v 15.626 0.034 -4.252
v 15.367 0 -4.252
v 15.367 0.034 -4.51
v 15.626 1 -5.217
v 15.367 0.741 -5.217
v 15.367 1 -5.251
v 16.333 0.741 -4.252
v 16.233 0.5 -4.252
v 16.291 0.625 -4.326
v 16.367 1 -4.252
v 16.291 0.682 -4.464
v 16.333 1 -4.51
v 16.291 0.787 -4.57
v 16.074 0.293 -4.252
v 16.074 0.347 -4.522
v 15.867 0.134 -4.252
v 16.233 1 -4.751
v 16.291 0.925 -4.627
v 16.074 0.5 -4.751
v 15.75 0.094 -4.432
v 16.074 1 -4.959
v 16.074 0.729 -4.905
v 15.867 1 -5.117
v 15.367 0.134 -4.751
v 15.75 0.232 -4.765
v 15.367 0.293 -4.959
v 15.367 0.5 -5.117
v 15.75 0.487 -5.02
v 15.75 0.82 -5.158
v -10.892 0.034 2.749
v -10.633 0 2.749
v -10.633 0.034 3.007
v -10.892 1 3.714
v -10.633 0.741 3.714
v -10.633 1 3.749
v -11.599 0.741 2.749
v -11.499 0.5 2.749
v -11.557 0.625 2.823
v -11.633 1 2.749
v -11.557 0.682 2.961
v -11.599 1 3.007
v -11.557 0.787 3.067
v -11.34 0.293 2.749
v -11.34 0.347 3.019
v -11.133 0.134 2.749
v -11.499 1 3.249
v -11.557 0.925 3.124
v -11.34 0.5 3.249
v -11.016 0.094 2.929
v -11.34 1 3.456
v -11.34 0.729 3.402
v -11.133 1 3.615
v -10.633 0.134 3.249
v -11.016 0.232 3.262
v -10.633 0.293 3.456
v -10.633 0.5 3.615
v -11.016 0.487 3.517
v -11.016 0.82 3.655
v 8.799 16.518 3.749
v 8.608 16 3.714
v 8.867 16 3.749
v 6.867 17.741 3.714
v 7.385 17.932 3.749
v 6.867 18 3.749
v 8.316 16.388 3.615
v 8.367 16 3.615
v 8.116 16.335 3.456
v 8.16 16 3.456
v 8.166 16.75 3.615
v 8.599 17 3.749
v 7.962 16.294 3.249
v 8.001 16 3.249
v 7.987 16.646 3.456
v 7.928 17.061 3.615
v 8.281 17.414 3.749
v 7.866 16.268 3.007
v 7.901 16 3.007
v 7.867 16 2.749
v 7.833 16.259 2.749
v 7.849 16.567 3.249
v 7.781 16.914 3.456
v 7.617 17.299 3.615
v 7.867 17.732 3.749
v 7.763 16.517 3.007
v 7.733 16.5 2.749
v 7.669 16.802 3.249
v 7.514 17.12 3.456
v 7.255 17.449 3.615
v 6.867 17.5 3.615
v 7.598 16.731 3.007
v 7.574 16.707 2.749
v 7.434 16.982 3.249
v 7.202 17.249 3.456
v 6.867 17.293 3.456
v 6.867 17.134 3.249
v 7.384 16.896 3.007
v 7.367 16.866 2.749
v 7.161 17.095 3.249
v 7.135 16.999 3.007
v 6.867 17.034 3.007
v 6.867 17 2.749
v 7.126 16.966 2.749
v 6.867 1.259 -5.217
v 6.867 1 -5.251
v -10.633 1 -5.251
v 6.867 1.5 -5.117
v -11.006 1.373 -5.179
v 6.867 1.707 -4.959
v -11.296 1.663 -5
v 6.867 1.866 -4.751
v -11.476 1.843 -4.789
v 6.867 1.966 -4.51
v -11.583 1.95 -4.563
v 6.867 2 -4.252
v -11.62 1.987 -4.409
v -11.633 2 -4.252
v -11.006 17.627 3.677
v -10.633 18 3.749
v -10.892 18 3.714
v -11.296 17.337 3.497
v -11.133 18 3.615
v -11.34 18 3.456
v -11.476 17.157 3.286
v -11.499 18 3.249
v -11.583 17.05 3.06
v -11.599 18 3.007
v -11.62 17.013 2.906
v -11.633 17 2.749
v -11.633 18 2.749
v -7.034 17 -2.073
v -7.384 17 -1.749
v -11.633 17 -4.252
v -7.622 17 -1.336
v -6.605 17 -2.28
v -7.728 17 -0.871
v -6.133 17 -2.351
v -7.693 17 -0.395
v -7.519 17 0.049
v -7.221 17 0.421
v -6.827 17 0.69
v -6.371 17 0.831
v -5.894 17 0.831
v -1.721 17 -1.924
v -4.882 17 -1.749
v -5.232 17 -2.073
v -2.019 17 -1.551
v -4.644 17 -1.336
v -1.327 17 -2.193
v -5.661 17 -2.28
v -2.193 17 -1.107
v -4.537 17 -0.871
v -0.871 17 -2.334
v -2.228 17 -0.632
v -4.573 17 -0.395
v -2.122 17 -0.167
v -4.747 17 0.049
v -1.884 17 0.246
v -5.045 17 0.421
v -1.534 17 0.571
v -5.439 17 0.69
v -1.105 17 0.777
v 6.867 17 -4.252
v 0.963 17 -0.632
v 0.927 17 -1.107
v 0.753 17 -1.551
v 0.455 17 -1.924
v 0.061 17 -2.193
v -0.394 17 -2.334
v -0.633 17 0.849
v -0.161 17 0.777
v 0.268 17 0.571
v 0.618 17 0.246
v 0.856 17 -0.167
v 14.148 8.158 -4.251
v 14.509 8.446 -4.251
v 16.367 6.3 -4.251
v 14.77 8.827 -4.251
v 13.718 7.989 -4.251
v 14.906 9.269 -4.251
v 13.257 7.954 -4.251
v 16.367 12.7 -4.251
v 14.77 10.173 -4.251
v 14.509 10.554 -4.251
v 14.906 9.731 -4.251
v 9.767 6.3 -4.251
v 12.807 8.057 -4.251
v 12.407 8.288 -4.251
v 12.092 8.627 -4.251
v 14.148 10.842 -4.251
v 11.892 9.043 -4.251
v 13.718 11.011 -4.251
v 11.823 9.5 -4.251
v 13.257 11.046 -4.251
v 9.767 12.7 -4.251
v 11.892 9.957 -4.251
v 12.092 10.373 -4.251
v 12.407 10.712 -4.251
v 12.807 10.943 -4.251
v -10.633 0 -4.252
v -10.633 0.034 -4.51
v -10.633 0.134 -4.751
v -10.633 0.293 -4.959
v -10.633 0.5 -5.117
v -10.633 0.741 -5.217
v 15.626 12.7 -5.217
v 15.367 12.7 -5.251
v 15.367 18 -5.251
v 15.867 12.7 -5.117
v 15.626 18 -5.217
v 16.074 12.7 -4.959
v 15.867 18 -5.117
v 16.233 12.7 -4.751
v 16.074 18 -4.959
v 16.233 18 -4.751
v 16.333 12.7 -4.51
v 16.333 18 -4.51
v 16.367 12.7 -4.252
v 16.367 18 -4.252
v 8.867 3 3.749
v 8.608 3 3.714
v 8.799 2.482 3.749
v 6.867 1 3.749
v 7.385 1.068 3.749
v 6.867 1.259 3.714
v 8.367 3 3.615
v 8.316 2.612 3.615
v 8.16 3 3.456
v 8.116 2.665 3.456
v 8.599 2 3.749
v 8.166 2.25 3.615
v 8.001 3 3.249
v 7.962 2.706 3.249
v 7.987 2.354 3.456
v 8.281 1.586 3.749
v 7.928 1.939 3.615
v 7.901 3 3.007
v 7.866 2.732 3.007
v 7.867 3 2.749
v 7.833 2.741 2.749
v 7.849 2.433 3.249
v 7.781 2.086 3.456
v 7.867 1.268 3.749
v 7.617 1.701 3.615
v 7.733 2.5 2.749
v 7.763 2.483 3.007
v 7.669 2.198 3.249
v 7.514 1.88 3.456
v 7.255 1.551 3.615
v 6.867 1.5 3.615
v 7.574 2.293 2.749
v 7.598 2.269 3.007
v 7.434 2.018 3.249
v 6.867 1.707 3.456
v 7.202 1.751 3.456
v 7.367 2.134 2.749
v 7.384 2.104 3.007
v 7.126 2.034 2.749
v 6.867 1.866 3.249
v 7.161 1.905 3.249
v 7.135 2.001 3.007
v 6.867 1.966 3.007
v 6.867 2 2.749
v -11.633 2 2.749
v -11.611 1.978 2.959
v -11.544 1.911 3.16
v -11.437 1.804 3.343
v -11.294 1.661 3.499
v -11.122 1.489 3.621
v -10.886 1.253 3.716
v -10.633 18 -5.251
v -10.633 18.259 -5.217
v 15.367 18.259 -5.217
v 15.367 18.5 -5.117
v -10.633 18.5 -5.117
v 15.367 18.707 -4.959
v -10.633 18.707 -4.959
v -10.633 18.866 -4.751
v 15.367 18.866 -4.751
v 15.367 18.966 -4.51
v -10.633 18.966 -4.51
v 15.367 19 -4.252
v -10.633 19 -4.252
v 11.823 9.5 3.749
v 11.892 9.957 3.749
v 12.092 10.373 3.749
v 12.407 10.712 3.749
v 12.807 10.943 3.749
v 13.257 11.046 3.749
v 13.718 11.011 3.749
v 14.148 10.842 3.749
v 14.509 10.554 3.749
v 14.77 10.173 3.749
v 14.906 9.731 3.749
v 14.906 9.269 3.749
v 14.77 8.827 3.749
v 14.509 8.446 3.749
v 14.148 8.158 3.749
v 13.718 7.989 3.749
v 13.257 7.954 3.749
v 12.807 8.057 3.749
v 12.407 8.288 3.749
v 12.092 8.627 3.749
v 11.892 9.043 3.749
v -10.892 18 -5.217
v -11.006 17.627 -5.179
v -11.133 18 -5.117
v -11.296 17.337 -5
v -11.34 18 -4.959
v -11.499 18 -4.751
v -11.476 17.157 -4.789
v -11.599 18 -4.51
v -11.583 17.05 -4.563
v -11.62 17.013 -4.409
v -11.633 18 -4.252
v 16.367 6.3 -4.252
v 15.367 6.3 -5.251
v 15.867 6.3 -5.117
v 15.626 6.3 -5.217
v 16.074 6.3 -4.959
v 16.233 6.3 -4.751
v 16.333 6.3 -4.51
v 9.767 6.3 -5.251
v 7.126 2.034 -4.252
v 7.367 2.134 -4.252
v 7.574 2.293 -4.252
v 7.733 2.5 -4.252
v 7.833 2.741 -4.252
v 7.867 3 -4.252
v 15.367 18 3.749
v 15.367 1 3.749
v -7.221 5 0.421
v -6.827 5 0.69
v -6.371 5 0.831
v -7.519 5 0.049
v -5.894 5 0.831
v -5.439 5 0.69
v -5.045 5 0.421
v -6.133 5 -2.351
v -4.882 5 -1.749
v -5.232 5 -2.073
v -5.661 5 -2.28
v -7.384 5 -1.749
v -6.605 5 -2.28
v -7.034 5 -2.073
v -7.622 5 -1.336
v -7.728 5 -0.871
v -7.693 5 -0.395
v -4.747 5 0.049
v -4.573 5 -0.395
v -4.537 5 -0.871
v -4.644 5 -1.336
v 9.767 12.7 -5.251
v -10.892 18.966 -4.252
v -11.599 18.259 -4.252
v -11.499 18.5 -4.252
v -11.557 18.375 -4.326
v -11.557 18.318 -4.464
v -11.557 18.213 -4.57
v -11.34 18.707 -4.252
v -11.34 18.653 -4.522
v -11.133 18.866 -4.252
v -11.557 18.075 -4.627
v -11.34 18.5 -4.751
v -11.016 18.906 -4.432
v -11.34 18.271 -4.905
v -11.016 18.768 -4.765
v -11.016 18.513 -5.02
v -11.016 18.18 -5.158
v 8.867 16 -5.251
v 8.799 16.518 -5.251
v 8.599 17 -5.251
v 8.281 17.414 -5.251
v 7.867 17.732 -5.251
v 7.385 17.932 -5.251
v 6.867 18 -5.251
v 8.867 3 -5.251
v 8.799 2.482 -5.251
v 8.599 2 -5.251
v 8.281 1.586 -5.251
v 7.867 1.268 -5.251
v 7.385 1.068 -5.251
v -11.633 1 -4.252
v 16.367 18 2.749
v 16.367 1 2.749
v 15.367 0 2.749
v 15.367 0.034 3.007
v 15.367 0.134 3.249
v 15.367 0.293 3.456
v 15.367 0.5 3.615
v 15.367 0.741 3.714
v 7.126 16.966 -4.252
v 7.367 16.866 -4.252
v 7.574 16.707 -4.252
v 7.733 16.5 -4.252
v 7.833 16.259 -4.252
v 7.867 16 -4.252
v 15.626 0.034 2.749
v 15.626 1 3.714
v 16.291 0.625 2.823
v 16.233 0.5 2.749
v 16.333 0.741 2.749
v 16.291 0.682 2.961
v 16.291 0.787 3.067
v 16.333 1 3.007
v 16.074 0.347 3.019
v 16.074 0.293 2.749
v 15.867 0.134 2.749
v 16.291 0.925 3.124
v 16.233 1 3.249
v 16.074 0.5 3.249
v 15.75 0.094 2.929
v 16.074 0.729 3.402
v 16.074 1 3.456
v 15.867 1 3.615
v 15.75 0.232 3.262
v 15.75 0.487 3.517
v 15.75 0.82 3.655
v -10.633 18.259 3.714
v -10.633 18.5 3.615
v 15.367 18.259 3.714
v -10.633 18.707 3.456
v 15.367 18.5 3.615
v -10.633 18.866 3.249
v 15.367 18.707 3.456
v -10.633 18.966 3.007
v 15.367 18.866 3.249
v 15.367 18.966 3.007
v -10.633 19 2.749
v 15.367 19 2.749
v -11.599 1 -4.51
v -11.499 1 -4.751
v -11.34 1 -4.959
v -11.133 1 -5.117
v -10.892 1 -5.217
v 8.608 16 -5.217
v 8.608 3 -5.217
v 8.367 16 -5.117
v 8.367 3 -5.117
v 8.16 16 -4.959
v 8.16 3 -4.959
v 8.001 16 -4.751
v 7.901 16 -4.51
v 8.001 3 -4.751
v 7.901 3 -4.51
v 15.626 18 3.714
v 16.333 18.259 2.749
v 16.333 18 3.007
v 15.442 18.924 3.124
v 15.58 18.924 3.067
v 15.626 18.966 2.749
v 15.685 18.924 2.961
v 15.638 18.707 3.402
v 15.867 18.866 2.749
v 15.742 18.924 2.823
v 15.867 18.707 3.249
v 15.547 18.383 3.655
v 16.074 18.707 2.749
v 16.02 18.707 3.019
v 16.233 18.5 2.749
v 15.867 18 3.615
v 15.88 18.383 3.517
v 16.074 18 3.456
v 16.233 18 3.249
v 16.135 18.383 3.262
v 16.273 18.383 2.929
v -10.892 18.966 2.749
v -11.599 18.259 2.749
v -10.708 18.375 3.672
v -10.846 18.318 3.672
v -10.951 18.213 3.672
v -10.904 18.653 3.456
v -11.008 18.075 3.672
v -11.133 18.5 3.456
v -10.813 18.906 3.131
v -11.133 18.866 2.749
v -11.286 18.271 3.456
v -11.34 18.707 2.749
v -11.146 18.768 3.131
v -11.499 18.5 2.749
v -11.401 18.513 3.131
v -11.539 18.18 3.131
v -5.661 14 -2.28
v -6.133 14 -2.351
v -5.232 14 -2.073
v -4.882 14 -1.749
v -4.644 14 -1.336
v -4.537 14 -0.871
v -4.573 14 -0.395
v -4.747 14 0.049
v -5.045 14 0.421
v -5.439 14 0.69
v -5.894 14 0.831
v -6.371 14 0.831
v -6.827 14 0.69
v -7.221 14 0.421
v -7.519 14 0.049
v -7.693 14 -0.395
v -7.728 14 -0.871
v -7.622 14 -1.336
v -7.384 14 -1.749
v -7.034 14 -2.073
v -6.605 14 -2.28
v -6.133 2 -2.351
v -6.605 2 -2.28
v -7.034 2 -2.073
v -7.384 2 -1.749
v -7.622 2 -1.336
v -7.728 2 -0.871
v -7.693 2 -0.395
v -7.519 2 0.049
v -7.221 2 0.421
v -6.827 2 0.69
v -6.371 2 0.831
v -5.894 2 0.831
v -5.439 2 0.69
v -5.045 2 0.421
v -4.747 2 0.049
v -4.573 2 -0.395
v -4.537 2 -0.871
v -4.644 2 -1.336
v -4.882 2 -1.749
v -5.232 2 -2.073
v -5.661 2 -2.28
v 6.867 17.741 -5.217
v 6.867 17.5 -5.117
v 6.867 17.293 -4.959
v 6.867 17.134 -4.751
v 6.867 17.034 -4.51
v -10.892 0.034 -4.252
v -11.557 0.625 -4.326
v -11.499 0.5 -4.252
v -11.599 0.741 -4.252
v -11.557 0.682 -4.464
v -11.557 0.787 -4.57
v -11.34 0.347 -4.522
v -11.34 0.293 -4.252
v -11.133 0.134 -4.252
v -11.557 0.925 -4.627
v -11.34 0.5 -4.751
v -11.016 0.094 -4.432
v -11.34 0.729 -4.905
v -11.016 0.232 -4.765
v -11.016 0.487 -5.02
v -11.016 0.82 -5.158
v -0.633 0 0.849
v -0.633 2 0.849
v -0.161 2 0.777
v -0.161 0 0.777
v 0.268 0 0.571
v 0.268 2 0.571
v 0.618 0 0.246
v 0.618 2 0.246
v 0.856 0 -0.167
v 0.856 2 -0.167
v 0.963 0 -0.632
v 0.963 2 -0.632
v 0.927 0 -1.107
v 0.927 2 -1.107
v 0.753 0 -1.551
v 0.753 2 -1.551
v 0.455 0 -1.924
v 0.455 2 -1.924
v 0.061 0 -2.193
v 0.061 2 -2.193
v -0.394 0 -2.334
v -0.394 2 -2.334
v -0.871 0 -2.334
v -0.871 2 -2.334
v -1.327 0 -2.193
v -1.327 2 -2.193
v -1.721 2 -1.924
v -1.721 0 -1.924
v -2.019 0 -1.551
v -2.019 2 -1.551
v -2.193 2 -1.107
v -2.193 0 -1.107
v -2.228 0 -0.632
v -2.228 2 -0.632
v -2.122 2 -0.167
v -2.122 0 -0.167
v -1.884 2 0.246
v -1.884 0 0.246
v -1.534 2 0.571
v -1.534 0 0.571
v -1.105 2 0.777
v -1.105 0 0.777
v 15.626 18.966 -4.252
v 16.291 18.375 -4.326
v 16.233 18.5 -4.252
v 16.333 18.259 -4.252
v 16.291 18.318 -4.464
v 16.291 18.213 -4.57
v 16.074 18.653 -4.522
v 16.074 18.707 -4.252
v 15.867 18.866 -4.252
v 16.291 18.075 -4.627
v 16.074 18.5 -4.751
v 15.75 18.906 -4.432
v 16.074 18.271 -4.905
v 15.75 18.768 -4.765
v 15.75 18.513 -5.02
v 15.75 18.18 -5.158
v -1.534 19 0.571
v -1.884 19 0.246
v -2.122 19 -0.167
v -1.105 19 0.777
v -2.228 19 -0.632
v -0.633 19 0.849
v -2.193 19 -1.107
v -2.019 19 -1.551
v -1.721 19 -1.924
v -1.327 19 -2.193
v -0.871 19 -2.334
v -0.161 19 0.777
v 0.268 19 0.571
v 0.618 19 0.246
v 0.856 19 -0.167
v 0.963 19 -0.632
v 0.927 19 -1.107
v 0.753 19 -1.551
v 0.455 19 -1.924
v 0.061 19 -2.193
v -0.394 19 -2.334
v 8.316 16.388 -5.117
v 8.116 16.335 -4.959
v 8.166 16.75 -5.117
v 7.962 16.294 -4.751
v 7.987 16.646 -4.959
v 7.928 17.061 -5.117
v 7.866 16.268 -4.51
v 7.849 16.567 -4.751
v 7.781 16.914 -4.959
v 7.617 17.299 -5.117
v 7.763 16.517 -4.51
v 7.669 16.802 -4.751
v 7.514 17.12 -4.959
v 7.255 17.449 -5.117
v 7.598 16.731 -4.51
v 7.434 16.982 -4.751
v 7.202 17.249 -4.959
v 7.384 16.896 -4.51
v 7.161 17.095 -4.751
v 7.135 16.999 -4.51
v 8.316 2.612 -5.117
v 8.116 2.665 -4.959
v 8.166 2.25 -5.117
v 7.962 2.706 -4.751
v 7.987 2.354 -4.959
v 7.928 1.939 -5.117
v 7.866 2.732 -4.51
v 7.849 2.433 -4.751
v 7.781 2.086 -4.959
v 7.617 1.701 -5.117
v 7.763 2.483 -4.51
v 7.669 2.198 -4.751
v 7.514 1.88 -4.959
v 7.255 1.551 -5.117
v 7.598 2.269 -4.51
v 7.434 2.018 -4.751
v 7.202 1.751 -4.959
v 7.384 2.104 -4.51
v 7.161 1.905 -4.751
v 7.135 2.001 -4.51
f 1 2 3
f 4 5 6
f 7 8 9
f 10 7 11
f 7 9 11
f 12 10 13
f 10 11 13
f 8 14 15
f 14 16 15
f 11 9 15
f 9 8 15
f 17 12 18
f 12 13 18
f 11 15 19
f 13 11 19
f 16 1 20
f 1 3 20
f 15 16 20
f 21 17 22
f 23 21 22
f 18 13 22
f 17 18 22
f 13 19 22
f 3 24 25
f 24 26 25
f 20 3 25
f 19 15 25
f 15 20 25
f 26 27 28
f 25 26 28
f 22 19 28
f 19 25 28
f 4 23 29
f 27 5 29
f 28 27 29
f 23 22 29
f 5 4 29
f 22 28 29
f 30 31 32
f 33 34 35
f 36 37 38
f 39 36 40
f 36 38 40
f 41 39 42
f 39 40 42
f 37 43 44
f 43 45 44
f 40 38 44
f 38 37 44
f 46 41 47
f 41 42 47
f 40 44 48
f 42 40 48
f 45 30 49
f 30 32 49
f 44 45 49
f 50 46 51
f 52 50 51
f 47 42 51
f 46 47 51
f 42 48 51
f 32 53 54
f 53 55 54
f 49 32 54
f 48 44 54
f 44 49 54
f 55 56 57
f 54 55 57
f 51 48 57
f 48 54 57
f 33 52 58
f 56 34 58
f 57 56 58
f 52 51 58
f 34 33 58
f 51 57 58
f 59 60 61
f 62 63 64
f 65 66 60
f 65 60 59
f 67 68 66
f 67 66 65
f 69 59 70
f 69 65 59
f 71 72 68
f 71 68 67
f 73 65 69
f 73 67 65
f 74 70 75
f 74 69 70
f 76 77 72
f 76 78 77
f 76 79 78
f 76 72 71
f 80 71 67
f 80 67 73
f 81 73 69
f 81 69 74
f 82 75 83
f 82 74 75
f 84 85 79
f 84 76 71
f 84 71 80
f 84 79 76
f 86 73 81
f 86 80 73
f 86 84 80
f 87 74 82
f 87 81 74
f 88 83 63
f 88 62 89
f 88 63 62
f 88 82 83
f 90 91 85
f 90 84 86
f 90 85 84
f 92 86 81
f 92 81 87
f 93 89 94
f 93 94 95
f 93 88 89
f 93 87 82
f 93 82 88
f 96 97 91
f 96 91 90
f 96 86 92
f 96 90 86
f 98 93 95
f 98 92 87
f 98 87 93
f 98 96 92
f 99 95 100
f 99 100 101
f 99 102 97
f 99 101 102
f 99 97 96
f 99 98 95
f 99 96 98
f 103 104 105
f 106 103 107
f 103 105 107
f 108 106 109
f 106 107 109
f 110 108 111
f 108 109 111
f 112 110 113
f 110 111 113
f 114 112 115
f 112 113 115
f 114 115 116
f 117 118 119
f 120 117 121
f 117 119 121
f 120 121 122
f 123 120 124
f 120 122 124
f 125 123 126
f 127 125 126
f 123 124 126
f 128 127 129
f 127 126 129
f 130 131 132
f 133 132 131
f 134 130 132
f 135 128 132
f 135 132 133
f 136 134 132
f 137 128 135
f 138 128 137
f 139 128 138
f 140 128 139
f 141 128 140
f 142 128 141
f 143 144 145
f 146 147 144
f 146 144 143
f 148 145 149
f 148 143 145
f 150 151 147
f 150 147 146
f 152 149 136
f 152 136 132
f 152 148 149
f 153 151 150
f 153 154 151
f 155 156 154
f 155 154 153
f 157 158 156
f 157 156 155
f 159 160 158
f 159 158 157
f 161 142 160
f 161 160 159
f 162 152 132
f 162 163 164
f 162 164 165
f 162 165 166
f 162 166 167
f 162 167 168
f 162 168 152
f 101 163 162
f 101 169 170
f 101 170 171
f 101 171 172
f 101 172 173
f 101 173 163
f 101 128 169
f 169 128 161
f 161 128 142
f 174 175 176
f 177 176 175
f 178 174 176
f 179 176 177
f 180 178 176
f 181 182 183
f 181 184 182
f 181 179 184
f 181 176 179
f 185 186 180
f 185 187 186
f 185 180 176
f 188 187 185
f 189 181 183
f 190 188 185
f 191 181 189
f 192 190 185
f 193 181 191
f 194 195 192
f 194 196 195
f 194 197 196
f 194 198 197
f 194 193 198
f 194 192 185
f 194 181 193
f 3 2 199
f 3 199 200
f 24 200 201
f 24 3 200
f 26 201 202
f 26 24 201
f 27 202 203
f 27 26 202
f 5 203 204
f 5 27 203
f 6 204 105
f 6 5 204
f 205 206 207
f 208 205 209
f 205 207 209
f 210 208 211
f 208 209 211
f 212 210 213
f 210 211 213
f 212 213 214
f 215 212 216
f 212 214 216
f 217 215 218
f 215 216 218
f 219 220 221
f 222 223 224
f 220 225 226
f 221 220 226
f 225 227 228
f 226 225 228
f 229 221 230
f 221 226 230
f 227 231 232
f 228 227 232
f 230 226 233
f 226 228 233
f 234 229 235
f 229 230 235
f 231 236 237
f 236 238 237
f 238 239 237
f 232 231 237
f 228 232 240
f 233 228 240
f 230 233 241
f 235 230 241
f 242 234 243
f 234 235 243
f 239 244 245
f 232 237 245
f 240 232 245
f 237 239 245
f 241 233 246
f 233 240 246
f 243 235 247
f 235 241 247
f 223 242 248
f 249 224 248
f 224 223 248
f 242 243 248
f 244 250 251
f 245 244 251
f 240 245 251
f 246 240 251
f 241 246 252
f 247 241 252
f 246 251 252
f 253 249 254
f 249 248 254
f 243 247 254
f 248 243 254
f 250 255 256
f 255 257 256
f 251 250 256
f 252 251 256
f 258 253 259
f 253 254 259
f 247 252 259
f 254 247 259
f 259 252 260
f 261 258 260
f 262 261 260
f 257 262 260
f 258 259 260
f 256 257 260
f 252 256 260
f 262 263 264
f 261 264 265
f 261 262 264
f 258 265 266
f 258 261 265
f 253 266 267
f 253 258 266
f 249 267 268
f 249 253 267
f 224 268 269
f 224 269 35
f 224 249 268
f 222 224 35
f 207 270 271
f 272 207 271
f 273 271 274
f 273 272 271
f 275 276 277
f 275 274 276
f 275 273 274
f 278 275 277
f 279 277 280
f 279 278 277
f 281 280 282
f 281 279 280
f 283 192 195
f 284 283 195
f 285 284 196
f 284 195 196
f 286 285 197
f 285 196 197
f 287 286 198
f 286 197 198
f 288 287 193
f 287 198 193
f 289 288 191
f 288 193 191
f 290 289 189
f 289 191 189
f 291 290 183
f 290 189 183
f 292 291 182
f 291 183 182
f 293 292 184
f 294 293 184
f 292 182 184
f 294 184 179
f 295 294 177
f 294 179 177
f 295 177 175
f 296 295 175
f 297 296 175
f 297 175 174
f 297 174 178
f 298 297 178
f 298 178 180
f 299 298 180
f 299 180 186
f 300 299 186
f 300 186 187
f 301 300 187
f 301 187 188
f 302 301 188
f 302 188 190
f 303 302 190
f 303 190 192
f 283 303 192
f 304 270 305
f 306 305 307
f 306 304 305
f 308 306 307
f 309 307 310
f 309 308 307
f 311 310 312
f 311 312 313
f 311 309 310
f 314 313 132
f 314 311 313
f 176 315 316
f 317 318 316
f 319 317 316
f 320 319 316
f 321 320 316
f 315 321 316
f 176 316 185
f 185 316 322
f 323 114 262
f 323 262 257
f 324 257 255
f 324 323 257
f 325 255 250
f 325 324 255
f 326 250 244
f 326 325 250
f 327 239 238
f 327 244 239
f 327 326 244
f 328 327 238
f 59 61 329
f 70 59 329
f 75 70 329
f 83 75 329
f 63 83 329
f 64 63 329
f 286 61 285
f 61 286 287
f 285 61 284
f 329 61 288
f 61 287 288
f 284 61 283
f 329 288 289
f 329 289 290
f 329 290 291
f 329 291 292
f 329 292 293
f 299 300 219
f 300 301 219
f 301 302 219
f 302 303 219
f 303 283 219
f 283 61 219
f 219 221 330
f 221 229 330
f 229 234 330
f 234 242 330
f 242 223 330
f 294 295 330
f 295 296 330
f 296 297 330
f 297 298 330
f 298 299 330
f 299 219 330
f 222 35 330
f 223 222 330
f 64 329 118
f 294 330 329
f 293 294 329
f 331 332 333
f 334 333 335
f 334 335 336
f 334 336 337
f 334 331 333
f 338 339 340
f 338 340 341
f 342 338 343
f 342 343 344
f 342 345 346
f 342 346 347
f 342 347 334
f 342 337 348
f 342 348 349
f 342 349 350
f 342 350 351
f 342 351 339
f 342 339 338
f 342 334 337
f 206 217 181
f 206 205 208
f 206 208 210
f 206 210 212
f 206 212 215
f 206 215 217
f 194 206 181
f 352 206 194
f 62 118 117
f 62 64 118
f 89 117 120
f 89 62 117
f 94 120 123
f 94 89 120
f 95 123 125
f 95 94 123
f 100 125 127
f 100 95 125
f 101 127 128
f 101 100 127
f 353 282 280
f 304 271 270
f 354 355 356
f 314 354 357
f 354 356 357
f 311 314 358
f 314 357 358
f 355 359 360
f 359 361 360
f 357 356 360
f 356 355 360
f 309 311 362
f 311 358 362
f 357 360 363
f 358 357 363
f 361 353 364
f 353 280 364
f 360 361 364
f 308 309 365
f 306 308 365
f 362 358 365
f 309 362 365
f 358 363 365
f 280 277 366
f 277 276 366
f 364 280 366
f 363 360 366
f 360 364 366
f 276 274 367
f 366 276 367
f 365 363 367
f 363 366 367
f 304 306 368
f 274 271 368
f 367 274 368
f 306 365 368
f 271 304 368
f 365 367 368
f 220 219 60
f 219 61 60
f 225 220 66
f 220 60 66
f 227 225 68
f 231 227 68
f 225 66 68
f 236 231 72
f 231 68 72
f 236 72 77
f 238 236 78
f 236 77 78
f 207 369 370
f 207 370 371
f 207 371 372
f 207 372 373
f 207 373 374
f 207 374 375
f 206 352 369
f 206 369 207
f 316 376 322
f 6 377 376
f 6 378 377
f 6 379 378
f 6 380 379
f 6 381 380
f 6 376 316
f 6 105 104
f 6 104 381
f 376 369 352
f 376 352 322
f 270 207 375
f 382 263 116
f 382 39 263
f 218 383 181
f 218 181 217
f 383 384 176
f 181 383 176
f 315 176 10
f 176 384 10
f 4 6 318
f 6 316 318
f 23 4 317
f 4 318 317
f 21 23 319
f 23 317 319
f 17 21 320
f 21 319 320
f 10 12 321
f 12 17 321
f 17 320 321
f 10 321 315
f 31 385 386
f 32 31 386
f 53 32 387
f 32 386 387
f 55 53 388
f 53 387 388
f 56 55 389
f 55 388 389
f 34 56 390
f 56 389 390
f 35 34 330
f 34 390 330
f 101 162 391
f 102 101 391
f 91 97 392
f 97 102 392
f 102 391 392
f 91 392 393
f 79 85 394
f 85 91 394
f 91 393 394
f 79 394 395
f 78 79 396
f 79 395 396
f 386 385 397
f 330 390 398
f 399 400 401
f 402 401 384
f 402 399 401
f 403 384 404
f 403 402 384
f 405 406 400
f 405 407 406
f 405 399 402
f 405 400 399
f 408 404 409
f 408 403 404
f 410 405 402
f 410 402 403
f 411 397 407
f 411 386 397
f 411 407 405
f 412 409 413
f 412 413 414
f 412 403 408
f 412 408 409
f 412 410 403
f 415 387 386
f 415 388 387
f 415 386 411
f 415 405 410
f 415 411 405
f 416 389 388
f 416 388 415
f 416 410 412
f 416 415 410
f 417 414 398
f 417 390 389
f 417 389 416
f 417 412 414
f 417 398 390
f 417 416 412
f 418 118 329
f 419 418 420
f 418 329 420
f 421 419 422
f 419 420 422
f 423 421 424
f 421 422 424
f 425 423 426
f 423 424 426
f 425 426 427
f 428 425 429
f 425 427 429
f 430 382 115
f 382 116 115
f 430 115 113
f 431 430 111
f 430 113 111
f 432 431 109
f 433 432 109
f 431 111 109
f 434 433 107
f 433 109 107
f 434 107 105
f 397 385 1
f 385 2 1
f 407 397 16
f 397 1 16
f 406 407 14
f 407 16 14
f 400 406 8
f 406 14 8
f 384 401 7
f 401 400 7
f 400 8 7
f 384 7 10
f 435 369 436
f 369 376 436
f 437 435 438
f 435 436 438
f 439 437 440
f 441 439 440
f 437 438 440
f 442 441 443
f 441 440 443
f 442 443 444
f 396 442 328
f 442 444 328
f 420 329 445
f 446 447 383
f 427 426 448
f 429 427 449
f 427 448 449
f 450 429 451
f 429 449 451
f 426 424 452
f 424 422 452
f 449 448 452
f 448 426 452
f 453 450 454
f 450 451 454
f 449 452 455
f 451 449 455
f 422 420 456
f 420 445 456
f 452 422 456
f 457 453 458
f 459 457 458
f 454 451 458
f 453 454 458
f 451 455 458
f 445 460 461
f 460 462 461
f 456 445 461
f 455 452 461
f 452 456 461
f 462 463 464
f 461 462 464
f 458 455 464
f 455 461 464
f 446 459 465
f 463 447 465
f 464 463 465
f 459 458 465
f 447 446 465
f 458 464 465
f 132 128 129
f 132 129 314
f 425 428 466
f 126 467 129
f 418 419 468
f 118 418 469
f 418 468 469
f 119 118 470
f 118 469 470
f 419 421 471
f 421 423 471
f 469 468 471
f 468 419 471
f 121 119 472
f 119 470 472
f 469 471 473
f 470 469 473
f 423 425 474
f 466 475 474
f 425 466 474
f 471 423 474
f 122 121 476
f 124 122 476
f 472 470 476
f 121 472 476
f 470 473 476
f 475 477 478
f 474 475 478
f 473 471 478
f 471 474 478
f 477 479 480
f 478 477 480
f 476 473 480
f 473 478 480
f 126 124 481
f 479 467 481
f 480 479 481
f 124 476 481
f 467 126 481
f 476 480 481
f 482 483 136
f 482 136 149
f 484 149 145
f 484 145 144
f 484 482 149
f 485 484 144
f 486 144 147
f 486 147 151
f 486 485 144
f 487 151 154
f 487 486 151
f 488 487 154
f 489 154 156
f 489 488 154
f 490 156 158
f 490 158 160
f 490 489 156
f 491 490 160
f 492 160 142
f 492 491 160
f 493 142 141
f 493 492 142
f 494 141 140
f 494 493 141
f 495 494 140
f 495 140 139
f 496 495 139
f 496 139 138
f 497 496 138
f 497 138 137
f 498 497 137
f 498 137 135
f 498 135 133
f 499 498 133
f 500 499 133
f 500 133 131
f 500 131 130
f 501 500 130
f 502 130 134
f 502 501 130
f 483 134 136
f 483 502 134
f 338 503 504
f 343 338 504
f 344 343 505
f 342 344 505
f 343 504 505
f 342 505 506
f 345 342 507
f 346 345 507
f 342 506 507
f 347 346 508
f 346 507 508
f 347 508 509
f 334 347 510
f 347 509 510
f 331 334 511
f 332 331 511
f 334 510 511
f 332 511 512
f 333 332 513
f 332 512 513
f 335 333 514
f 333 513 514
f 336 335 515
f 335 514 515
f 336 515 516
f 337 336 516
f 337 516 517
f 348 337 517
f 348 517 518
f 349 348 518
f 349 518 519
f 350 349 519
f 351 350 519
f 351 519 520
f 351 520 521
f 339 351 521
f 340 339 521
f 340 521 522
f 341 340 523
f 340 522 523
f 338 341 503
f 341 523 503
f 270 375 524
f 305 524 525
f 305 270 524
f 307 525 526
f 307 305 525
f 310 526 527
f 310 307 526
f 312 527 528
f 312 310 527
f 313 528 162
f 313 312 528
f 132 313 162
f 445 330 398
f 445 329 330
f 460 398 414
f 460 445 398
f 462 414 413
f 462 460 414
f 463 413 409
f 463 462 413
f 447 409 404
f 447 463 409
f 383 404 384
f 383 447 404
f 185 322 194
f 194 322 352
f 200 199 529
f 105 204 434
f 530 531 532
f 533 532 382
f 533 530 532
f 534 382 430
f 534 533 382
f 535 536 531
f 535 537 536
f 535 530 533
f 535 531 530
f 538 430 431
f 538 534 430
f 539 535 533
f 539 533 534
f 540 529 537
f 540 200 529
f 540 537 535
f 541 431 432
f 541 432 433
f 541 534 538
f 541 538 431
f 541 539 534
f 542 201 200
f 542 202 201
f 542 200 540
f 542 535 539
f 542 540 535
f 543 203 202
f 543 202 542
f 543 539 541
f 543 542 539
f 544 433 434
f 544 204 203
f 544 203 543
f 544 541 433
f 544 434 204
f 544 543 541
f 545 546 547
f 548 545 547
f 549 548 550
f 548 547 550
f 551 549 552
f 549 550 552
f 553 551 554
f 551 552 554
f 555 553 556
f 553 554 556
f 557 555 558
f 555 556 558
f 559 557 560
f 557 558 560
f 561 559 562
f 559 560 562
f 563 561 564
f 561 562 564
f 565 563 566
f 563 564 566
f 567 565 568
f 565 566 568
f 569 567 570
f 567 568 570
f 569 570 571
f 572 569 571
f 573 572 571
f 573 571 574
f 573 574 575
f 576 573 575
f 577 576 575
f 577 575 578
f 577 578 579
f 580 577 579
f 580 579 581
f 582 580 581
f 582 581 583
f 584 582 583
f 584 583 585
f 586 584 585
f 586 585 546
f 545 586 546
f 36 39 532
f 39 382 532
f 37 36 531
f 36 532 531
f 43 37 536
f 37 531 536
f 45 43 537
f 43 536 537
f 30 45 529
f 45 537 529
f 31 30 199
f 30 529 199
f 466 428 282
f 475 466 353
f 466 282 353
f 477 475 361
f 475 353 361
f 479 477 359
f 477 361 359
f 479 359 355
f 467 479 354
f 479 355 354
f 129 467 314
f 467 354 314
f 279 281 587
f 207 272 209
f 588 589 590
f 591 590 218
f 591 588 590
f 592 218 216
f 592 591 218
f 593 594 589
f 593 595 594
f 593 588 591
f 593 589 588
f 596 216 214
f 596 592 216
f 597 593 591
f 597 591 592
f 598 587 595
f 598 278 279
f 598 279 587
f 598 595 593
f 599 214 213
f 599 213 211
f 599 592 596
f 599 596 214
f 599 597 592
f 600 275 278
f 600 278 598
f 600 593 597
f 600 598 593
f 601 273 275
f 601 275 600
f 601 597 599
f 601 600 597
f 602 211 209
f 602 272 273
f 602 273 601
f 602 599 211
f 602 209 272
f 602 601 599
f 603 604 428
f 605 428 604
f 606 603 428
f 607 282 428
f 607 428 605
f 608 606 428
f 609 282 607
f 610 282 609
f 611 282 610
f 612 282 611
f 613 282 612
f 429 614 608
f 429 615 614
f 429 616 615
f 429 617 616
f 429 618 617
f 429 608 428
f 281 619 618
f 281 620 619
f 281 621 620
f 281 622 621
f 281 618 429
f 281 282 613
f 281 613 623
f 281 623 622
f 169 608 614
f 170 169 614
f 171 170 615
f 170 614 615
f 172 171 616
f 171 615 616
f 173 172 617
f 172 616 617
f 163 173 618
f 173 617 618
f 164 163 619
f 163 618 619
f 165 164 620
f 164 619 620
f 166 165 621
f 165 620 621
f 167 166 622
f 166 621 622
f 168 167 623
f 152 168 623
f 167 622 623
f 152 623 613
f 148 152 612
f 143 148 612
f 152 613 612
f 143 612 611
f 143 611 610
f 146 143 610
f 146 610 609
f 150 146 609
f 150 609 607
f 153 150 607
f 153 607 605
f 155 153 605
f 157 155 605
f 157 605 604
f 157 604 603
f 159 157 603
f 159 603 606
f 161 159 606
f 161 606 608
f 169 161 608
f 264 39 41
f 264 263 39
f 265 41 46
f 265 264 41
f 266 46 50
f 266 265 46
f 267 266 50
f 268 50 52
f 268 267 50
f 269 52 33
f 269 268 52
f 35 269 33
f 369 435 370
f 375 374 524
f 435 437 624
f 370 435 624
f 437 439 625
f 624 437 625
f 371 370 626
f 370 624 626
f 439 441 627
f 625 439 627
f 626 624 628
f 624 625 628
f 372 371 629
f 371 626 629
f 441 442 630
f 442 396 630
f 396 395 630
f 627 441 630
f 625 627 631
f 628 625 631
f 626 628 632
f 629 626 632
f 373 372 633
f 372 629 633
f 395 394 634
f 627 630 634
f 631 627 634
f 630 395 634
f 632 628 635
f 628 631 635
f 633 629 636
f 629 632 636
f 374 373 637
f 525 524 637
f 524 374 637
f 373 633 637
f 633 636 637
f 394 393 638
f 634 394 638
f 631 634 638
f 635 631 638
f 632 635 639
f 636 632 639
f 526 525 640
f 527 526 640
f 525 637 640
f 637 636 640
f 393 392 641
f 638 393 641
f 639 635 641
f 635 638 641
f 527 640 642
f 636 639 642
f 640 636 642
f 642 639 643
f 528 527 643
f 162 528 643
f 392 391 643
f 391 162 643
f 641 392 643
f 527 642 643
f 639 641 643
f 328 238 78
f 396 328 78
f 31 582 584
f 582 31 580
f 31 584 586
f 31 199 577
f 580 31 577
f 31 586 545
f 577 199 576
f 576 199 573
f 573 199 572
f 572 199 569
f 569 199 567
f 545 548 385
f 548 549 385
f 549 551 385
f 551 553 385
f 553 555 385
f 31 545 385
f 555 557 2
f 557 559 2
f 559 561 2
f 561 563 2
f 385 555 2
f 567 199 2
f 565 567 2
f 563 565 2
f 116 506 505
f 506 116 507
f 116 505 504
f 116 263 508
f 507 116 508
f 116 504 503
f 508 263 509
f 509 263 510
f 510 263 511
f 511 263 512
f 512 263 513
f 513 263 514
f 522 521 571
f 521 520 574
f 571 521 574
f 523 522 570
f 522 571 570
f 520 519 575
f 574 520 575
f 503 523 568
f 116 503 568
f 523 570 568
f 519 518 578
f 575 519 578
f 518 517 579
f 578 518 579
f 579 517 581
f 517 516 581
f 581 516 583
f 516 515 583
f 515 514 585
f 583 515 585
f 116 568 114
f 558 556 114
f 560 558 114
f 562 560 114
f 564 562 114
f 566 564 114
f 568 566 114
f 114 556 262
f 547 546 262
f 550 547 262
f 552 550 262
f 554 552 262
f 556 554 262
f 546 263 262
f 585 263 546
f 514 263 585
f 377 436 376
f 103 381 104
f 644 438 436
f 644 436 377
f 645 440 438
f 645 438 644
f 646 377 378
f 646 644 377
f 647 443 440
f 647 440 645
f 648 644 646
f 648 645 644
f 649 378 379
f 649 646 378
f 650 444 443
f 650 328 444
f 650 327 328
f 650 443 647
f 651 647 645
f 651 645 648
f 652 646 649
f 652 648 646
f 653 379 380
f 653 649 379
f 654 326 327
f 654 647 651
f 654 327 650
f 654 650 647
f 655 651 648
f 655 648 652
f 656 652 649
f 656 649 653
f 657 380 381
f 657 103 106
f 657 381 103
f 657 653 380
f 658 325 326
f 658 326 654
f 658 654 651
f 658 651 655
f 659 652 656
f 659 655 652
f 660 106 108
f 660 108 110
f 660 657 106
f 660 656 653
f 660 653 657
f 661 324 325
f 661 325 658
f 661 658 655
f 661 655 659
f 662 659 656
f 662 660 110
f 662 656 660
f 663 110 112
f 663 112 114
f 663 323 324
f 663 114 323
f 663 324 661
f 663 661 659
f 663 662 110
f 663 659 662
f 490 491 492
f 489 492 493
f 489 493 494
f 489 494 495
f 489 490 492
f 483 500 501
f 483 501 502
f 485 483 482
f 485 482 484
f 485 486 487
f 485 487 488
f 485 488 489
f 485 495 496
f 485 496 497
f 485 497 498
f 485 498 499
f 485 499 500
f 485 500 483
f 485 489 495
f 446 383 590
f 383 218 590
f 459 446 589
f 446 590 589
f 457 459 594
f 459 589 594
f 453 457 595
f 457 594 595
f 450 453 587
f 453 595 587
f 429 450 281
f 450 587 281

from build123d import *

# Parameters (mm, degrees)
SKETCH1_W      = 28
SKETCH1_H      = 9
EXTRUDE1_DEPTH = 19
SKETCH2_R      = 1.6
EXTRUDE2_DEPTH = 26.621437653
SKETCH3_W      = 19.5
SKETCH3_H      = 15
EXTRUDE3_DEPTH = 27.643580689
SKETCH6_R      = 1.6
EXTRUDE4_DEPTH = 3
EXTRUDE5_START = 3
SKETCH7_R      = 1.6
EXTRUDE5_DEPTH = 3
SKETCH8_W      = 6.6
SKETCH8_H      = 6.4
EXTRUDE6_DEPTH = 1
SKETCH9_R      = 1.55
EXTRUDE7_DEPTH = 27.322621297
FILLET1_R      = 1


with BuildPart() as part:
    # Sketch1 → Extrude1 (new body)
    with BuildSketch(Plane(origin=(0, 0, 0), x_dir=(1, 0, 0), z_dir=(0, 1, 0))):
        with Locations((2.367052023, 0.751445087)):
            Rectangle(SKETCH1_W, SKETCH1_H)
    extrude(amount=EXTRUDE1_DEPTH)

    # Sketch2 → Extrude2 (cut, through all)
    with BuildSketch(Plane(origin=(0, 19, 0), x_dir=(1, 0, 0), z_dir=(0, 1, 0))):
        with Locations(Location((-0.632947977, 0.751445087, 0), (0, 0, 270))):
            Circle(SKETCH2_R)
    extrude(amount=-EXTRUDE2_DEPTH, mode=Mode.SUBTRACT)

    # Sketch3 → Extrude3 (cut, through all)
    with BuildSketch(Plane.XY.offset(3.748554913)):
        with Locations((-1.882947977, 9.5)):
            Rectangle(SKETCH3_W, SKETCH3_H)
    extrude(amount=-EXTRUDE3_DEPTH, mode=Mode.SUBTRACT)

    # Sketch6 → Extrude4 (add)
    with BuildSketch(Plane(origin=(0, 2, 0), x_dir=(1, 0, 0), z_dir=(0, 1, 0))):
        with Locations(Location((-6.132947977, 0.751445087, 0), (0, 0, 90))):
            Circle(SKETCH6_R)
    extrude(amount=EXTRUDE4_DEPTH)

    # Sketch7 → Extrude5 (add)
    with BuildSketch(Plane.XZ.offset(-17).offset(EXTRUDE5_START)):
        with Locations(Location((-6.132947977, -0.751445087, 0), (0, 0, 270))):
            Circle(SKETCH7_R)
    extrude(amount=-EXTRUDE5_DEPTH)

    # Sketch8 → Extrude6 (cut)
    with BuildSketch(Plane(origin=(0, 0, -5.251445087), x_dir=(-1, 0, 0), z_dir=(0, 0, -1))):
        with Locations((-13.067052023, 9.5)):
            Rectangle(SKETCH8_W, SKETCH8_H)
    extrude(amount=-EXTRUDE6_DEPTH, mode=Mode.SUBTRACT)

    # Sketch9 → Extrude7 (cut, through all)
    with BuildSketch(Plane(origin=(0, 0, -4.251445087), x_dir=(-1, 0, 0), z_dir=(0, 0, -1))):
        with Locations((-13.373052023, 9.5)):
            Circle(SKETCH9_R)
    extrude(amount=-EXTRUDE7_DEPTH, mode=Mode.SUBTRACT)

    # Fillet1
    fillet1_edges = [part.edges().sort_by_distance(p)[0] for p in [
        (2.367052023, 19, -5.251445087),
        (2.367052023, 0, 3.748554913),
        (2.367052023, 0, -5.251445087),
        (16.367052023, 0, -0.751445087),
        (16.367052023, 3.15, -5.251445087),
        (16.367052023, 9.5, 3.748554913),
        (-11.632947977, 0, -0.751445087),
        (-1.882947977, 2, 3.748554913),
        (-1.882947977, 2, -5.251445087),
        (7.867052023, 2, -0.751445087),
        (7.867052023, 17, -0.751445087),
        (7.867052023, 9.5, -5.251445087),
        (-1.882947977, 17, -5.251445087),
        (-11.632947977, 19, -0.751445087),
        (7.867052023, 9.5, 3.748554913),
        (-1.882947977, 17, 3.748554913),
        (2.367052023, 19, 3.748554913),
        (16.367052023, 19, -0.751445087),
        (16.367052023, 15.85, -5.251445087),
        (-11.632947977, 1, -5.251445087),
        (-11.632947977, 1, 3.748554913),
        (-11.632947977, 18, -5.251445087),
        (-11.632947977, 18, 3.748554913),
    ]]
    fillet(fillet1_edges, radius=FILLET1_R - 0.0001)  # a hair under: the kernel refuses the full size


solid = part.part
